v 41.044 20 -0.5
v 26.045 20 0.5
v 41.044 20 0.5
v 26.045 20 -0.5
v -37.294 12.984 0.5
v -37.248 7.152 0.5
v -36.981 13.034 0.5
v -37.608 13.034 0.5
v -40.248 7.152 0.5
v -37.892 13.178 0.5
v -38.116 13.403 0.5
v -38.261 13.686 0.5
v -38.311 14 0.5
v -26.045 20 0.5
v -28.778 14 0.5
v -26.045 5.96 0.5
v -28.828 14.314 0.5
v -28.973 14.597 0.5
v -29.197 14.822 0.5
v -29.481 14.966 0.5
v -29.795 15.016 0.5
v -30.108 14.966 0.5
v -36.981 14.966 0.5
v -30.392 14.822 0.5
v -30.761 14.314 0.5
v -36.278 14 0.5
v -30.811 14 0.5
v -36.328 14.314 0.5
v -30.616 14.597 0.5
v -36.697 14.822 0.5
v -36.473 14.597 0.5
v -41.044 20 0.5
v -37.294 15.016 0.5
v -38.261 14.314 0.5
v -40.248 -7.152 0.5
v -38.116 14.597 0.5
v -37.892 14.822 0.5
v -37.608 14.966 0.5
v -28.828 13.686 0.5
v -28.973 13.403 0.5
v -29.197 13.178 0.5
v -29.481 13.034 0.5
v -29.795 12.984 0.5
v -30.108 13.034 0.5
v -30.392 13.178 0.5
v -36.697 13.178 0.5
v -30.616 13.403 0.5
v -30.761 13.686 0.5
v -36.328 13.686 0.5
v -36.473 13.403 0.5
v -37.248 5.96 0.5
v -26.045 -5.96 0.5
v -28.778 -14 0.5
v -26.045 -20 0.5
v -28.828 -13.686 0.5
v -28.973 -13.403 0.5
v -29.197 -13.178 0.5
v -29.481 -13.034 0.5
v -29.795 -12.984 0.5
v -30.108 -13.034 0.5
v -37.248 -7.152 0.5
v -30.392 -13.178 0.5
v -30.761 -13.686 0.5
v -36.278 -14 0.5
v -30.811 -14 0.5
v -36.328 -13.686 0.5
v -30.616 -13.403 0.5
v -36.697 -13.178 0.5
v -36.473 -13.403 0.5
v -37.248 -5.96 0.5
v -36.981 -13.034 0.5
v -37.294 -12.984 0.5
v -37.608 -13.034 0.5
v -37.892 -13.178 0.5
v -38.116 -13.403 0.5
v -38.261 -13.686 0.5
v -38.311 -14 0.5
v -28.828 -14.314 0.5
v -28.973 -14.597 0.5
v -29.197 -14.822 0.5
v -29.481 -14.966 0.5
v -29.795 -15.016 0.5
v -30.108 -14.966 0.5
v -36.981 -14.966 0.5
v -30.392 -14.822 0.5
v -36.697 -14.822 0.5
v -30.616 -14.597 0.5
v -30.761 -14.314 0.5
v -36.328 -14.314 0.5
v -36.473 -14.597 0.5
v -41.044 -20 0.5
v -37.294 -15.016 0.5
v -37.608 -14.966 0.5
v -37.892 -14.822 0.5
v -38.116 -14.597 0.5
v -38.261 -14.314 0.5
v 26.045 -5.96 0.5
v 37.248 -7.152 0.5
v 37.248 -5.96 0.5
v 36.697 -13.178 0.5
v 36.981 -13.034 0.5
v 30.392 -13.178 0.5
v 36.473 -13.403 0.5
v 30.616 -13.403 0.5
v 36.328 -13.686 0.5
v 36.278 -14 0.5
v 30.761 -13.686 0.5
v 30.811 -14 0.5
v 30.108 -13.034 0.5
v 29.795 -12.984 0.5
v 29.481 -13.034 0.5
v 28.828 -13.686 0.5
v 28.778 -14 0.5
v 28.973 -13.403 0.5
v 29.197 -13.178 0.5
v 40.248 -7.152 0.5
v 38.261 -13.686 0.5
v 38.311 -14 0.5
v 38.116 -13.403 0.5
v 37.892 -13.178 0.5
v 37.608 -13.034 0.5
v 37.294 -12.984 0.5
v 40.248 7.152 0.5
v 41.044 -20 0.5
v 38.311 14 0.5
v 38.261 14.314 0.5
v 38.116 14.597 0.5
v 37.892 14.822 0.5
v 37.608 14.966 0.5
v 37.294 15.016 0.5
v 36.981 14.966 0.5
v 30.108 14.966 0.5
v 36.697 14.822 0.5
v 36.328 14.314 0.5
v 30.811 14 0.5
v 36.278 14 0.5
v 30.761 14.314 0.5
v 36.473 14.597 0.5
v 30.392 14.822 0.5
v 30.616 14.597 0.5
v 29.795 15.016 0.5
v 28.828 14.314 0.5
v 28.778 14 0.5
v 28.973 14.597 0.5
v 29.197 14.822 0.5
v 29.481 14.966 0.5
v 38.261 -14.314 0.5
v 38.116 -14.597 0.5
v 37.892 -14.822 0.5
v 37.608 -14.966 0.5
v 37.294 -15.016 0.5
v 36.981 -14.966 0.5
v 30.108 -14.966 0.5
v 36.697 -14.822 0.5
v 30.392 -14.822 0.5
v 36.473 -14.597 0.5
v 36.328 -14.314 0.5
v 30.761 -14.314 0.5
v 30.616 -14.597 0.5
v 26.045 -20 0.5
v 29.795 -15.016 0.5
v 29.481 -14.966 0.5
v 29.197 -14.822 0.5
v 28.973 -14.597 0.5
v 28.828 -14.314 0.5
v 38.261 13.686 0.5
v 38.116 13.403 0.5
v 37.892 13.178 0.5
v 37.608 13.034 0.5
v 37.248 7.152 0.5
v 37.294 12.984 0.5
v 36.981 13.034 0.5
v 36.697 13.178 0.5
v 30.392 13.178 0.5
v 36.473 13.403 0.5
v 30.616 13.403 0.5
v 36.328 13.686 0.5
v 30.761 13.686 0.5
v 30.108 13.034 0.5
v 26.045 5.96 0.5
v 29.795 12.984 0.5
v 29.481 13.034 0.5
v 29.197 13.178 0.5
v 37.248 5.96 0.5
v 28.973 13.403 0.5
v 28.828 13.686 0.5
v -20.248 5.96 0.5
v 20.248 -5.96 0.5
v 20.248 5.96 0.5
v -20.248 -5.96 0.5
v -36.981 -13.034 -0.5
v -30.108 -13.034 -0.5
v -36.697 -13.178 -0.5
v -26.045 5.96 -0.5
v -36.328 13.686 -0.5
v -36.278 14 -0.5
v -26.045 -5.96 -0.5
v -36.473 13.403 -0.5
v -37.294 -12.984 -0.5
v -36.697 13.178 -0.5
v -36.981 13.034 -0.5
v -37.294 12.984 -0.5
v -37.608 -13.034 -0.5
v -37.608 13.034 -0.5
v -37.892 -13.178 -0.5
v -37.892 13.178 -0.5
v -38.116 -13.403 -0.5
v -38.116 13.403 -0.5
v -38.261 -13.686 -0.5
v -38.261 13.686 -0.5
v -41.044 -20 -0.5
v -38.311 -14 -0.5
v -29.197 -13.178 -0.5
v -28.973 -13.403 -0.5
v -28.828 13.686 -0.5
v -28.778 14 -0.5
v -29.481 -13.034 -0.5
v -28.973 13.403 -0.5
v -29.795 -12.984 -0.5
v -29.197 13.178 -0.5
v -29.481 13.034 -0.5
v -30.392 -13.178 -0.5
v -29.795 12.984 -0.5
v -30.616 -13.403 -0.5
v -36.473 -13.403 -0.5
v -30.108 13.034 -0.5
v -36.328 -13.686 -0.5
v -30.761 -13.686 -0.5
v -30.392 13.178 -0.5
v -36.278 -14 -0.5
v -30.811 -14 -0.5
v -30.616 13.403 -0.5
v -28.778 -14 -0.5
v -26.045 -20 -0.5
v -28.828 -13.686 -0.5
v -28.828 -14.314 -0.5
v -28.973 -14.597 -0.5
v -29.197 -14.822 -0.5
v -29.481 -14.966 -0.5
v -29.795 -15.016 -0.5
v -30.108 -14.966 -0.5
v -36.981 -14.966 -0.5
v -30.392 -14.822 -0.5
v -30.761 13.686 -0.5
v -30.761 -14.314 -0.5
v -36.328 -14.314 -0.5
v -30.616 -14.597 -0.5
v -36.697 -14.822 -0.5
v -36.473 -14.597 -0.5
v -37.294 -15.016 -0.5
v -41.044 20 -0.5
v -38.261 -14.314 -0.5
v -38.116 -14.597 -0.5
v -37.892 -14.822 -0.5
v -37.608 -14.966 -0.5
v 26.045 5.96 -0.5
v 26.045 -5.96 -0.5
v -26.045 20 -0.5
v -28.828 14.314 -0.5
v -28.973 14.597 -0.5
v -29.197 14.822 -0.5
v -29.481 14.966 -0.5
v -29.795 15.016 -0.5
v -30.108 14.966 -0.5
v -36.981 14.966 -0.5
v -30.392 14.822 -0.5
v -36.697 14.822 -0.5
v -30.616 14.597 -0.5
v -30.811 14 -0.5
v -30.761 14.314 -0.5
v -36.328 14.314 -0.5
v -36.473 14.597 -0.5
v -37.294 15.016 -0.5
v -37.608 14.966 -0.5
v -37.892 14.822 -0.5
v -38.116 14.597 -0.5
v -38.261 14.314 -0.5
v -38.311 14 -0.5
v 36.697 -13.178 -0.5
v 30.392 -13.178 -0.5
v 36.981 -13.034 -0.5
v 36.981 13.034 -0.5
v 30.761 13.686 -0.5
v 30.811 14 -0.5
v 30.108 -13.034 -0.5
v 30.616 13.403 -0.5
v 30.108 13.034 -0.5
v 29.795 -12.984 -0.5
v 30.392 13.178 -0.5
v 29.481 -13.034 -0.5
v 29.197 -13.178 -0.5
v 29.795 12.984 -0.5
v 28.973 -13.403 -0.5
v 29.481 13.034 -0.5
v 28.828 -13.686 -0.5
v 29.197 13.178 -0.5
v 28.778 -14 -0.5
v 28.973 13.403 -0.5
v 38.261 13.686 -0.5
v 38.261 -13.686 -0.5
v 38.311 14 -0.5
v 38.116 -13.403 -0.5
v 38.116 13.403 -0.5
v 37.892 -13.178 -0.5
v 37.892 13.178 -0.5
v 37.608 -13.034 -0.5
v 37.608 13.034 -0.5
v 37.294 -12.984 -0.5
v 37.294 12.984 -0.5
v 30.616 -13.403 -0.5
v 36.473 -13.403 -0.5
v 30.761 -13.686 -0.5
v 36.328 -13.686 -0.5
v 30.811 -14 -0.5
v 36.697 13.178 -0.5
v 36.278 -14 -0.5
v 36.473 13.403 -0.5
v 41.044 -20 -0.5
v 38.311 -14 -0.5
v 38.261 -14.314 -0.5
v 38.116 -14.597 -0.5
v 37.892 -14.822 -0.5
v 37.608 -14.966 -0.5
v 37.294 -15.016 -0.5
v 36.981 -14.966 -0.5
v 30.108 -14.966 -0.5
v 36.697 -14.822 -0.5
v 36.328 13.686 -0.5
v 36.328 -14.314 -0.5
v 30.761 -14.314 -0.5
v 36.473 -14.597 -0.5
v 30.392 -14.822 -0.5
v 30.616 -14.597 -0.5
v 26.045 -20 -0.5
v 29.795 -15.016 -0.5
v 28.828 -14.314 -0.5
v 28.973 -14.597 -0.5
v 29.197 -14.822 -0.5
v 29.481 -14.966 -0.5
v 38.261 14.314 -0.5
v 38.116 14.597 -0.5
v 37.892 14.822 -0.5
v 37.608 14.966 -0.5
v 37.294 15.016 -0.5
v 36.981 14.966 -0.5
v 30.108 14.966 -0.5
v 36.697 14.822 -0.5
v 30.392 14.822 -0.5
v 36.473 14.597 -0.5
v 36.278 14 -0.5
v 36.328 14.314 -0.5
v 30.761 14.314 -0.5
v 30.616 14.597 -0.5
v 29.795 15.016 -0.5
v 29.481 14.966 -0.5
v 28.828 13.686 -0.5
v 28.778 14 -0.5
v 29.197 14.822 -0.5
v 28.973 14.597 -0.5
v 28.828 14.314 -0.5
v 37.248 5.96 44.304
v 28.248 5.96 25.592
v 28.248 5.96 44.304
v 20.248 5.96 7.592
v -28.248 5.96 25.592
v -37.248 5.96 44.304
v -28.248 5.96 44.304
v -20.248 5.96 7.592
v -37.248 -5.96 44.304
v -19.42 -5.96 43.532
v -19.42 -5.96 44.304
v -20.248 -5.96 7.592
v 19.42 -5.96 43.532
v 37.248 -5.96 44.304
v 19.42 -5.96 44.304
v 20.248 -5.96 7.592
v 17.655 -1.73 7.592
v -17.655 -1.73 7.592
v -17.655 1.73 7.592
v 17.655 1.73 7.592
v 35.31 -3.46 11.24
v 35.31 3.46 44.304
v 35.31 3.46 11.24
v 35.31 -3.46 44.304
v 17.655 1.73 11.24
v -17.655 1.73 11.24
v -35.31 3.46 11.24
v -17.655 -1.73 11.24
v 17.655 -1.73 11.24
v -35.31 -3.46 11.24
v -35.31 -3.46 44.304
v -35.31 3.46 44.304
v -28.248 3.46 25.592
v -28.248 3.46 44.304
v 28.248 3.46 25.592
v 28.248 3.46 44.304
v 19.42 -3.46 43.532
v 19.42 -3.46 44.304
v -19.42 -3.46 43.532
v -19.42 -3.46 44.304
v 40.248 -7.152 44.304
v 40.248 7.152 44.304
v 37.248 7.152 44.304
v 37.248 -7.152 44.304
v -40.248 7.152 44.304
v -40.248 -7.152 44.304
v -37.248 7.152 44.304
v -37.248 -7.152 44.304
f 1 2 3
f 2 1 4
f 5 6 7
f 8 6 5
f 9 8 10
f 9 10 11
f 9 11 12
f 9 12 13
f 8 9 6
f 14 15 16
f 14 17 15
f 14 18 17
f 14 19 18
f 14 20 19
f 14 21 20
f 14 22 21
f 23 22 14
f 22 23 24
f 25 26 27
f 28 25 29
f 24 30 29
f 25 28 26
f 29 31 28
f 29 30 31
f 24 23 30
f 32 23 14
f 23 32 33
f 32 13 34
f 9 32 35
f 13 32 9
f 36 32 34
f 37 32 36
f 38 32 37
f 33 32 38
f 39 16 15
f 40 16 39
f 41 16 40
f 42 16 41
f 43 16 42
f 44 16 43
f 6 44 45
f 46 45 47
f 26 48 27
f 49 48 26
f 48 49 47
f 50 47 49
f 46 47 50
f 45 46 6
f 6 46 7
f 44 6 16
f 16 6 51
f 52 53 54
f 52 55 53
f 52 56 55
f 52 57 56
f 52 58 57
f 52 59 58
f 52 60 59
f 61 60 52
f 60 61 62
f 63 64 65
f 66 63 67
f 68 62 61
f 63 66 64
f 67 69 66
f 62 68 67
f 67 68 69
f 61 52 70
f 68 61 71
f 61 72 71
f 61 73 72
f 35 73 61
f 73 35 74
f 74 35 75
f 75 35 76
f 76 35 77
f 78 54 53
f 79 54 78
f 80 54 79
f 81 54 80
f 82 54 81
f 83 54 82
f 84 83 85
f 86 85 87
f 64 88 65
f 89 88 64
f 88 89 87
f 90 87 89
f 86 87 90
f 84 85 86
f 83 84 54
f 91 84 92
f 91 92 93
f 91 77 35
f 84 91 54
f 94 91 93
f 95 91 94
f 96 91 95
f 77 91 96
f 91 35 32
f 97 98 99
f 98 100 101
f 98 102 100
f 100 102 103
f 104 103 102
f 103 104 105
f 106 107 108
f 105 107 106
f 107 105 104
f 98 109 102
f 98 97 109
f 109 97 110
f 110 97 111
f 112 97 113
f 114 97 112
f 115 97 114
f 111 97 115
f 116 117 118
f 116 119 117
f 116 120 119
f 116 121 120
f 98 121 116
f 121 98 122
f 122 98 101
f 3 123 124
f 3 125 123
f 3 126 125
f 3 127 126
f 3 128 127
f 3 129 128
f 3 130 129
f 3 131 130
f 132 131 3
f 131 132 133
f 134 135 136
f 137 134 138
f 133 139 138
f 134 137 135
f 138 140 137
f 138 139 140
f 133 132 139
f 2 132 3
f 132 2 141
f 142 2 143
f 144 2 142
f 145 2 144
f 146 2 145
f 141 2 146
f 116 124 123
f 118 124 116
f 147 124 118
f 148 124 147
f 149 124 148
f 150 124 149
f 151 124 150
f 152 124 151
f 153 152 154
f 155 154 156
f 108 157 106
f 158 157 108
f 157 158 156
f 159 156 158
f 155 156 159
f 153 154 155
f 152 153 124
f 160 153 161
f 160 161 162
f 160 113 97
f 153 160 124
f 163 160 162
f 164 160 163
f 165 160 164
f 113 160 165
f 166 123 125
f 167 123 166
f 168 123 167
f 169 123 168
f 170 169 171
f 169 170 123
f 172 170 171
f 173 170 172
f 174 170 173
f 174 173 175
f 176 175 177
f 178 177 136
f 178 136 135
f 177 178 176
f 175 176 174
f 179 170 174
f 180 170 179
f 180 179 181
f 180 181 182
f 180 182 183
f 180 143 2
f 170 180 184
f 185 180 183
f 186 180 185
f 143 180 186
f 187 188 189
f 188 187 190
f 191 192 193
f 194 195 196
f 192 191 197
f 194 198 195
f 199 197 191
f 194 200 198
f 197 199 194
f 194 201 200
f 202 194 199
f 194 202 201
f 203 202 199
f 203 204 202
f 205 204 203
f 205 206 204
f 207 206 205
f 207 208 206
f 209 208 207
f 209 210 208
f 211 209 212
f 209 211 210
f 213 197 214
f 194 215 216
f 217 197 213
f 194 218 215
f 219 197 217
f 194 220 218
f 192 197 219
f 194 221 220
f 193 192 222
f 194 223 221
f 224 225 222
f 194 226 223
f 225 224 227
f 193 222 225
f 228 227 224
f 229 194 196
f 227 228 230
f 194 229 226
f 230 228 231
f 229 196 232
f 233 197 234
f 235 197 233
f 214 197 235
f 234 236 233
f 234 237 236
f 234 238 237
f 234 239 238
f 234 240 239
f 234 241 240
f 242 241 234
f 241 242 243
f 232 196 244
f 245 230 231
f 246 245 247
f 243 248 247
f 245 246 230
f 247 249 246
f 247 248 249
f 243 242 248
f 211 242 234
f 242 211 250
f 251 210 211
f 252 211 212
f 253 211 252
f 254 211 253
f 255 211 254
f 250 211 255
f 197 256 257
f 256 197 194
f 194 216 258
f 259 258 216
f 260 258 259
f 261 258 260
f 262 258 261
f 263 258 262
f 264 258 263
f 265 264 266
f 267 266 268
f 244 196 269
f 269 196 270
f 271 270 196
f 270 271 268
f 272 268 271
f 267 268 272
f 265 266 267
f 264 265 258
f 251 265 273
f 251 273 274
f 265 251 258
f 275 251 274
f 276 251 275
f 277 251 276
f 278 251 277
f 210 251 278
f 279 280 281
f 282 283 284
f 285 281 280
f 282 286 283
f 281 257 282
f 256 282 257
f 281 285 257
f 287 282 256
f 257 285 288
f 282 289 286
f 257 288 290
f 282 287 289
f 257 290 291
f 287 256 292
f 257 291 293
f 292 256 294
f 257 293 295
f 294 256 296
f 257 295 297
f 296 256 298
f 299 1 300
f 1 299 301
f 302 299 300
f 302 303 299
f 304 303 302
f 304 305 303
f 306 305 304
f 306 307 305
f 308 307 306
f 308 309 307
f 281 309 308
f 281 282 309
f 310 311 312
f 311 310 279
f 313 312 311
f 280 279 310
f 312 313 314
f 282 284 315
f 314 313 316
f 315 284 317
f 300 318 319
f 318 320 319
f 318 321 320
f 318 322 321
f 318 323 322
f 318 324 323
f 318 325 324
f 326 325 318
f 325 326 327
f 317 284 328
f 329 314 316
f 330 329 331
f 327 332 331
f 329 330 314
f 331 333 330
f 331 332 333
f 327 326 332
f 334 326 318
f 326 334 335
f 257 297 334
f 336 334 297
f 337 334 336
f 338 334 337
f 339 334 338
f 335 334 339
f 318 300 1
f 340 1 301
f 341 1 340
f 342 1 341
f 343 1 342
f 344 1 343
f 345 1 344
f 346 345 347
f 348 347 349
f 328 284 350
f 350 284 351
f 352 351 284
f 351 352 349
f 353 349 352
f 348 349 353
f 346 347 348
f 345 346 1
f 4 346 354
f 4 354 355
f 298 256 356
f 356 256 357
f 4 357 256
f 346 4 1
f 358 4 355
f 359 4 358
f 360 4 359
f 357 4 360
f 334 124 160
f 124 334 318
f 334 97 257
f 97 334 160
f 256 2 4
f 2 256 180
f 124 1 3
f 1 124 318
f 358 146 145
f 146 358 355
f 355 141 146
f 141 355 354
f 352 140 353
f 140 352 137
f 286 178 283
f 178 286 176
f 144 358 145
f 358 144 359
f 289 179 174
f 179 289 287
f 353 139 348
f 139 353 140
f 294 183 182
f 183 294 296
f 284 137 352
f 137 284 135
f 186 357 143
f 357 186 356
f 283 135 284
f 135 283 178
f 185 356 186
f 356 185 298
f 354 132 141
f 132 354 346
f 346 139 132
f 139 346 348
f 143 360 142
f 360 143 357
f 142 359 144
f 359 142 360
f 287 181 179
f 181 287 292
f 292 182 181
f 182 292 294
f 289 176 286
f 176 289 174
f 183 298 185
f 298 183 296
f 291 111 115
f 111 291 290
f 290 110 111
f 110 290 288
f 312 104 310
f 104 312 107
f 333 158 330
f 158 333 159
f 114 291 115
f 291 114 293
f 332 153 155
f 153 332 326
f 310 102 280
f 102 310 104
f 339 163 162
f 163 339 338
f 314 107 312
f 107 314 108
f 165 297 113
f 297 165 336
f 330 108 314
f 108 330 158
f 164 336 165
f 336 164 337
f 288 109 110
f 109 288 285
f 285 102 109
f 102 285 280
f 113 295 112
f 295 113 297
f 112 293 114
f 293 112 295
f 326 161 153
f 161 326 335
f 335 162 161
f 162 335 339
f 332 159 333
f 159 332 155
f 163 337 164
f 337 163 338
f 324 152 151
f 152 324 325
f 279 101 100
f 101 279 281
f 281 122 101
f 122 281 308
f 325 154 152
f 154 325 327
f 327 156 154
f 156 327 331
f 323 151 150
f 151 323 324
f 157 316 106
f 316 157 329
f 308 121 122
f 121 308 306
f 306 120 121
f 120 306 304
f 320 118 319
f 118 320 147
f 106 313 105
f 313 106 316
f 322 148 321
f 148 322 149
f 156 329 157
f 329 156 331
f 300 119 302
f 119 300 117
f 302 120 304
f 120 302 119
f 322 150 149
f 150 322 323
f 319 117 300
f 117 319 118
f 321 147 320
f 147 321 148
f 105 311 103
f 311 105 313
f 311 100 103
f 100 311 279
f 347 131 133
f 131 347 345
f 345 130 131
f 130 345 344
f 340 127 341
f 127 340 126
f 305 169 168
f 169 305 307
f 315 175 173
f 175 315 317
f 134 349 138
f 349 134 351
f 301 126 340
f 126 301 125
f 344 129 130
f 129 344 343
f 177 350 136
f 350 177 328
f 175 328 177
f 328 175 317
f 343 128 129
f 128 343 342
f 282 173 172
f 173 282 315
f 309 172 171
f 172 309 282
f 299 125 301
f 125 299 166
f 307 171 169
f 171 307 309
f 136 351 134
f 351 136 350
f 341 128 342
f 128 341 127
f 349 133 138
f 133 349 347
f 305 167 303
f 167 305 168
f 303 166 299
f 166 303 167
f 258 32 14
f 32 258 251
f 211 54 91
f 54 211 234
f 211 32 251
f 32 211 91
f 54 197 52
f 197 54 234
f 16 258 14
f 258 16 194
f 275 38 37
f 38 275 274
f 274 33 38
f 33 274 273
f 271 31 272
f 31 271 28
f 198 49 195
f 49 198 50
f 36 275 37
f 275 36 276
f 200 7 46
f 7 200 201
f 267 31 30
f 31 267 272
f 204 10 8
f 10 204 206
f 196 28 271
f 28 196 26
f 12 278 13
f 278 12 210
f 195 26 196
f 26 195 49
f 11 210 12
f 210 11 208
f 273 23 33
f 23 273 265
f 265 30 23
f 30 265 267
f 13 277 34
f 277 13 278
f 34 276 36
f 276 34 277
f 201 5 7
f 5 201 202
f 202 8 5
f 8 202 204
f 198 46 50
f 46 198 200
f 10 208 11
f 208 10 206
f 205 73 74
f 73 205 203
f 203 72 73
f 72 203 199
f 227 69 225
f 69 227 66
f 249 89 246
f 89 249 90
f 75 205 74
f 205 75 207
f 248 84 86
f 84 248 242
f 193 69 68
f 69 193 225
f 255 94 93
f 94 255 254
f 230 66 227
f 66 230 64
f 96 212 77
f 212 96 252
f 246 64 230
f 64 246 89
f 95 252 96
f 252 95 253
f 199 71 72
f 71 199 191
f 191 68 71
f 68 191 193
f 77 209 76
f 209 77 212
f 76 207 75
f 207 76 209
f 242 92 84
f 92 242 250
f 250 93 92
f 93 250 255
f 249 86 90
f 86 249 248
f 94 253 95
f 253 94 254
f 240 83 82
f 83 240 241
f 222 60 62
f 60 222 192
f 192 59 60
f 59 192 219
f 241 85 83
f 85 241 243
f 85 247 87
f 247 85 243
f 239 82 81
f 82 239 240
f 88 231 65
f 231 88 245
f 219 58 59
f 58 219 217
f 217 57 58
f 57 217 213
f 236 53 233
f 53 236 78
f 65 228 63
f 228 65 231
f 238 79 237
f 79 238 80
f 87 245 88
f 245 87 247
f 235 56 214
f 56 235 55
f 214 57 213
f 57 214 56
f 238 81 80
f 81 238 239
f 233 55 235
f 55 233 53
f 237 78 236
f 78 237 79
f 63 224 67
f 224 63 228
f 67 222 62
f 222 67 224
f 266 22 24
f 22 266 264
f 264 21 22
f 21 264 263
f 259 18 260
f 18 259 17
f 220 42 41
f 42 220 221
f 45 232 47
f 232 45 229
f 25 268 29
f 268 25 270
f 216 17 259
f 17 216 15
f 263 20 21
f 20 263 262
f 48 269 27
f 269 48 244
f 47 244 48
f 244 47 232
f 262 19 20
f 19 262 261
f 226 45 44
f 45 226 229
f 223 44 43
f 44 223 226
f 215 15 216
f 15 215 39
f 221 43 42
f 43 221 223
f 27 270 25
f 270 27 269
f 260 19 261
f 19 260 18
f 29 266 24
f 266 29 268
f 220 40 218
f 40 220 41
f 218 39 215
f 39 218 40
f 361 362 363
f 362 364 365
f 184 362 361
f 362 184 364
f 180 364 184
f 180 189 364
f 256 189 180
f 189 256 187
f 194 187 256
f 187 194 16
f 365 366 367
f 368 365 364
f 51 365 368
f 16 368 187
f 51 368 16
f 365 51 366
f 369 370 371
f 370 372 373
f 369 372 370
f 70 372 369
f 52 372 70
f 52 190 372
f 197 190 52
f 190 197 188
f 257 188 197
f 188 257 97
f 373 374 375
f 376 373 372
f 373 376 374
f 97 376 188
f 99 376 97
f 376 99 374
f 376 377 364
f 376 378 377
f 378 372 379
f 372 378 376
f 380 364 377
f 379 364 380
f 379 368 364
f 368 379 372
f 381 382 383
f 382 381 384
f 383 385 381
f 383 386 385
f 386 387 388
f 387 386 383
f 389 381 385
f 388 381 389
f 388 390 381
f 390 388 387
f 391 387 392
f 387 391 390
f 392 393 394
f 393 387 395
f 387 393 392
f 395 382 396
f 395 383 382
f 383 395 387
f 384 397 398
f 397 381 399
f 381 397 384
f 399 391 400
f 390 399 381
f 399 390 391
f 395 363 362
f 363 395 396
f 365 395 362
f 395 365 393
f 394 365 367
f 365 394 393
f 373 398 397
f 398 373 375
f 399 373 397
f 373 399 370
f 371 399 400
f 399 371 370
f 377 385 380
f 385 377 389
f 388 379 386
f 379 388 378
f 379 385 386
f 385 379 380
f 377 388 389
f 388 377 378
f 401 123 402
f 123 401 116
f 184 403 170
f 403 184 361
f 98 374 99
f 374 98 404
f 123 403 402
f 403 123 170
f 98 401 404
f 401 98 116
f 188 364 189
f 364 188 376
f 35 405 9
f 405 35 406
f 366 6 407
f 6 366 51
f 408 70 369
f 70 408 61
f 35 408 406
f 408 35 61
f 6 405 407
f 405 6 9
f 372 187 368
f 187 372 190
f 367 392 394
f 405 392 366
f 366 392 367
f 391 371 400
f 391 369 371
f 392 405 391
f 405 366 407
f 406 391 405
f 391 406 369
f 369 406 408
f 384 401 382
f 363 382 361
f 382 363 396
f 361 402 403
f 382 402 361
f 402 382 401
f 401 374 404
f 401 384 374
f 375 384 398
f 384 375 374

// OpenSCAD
// Variables
width = 40;
height = 15;
screw_offset_x = .35 * width;
screw_offset_y = .25 * height;
screw_radius = 1.016;
screw_height = 3;
res=20;


extruder_width = .04;
global_correction = 0.04 + ( 2*extruder_width);

phone_width = 70.5   + global_correction;
phone_depth = 6.8    + global_correction;
phone_height = 143.4 + global_correction;

casing_wiggle = 5;
casing_depth = phone_depth + casing_wiggle; 
casing_width = phone_width + casing_wiggle; 
casing_height = phone_height * .8;

screw_mount_placement =  ( .95 * phone_width ) / 2;


// Uncomment the below line to get the 2d projection
//projection( cut=true)
union() {
	// Draw primary stand
	//rotate(90) 
	//BaseStation();
	BaseStation();

	// Draw triangular supports
	//Support();
	//rotate(180)
	//Support();

	// Draw vertical supports


	// Draw the phone case itself
	difference() {

		union() {
			translate( [0,0, 65 ] ) {  
				DrawCase();  

			}
			translate( [.8*casing_width/2,0,0] ) 
				HorizontalSupport();
			translate( [-.8*casing_width/2,0,0] )
				rotate(180)
				HorizontalSupport();
		}   
		translate( [0,0,195] )
			DrawPhone(s=2.1);
	}

}


//translate( [0,0,80] )
//DrawPhone();

// Tringular Support
module Support( l=11,w=35,h=25) {
	translate( [ 0,  -.69 * screw_mount_placement, 0 ] )
		prism(l,w,h);
}

module VerticalSupport( height=1 ) {
	width = casing_depth * 1.2;
	translate( [7,width/-2,0] )
		cube( [3,width,height]);
}

module HorizontalSupport(height=10) {
	VerticalSupport(casing_height*1.07);
	translate([0,0,height/2])
		cube([20,casing_depth ,height], center=true);
}

module BaseStation() {
	union () {
		cube( [screw_mount_placement * 2, casing_depth, 1] , center=true);
		ScrewMount( screw_mount_placement,0,0);
		ScrewMount( -1 * screw_mount_placement,0,0);
	}
}


module DrawPhone( v = [0,0,0], s=1) {
	translate(v)
		cube( [s*phone_width , s*phone_depth, s*phone_height ], center = true );
}

module DrawCase() {
	y_off = 18;
	difference() {
		rotate(90)
			cube( [ casing_depth, casing_width, casing_height  ], center = true );
		DrawPhone([0,0,y_off]);
		DrawPhone([0,5,y_off], s=.8);
		DrawPhone([0,-5,y_off], s=.55);
		DrawPhone([0,0,-30], s=.5);

	}

}

module Screw(x,y,z) {
	translate( [x,y,z] )
		cylinder( screw_height, screw_radius, screw_radius, $fn=res, center = true );
}


module ScrewMount(x,y,z) {
	translate( [x,y,z] )
		rotate( 90 ) // Rotate for placement
		// Subtract screw holes from base
		difference()  {
			// Draw base
			cube( [width,height,1], center = true );
			// Draw screw holes
			Screw(screw_offset_x, screw_offset_y, 0);
			Screw(-1 * screw_offset_x, screw_offset_y, 0);
			Screw(-1 * screw_offset_x, -1 * screw_offset_y, 0);
			Screw(screw_offset_x, -1 * screw_offset_y, 0);

		}
}


module prism(l, w, h){
	translate([ -1 * l/2, -1 *  w/2,0])
		polyhedron(
				points=[[0,0,0], [l,0,0], [l,w,0], [0,w,0], [0,w,h], [l,w,h]],
				faces=[[0,1,2,3],[5,4,3,2],[0,4,5,1],[0,3,4],[5,2,1]]
			  );


}
